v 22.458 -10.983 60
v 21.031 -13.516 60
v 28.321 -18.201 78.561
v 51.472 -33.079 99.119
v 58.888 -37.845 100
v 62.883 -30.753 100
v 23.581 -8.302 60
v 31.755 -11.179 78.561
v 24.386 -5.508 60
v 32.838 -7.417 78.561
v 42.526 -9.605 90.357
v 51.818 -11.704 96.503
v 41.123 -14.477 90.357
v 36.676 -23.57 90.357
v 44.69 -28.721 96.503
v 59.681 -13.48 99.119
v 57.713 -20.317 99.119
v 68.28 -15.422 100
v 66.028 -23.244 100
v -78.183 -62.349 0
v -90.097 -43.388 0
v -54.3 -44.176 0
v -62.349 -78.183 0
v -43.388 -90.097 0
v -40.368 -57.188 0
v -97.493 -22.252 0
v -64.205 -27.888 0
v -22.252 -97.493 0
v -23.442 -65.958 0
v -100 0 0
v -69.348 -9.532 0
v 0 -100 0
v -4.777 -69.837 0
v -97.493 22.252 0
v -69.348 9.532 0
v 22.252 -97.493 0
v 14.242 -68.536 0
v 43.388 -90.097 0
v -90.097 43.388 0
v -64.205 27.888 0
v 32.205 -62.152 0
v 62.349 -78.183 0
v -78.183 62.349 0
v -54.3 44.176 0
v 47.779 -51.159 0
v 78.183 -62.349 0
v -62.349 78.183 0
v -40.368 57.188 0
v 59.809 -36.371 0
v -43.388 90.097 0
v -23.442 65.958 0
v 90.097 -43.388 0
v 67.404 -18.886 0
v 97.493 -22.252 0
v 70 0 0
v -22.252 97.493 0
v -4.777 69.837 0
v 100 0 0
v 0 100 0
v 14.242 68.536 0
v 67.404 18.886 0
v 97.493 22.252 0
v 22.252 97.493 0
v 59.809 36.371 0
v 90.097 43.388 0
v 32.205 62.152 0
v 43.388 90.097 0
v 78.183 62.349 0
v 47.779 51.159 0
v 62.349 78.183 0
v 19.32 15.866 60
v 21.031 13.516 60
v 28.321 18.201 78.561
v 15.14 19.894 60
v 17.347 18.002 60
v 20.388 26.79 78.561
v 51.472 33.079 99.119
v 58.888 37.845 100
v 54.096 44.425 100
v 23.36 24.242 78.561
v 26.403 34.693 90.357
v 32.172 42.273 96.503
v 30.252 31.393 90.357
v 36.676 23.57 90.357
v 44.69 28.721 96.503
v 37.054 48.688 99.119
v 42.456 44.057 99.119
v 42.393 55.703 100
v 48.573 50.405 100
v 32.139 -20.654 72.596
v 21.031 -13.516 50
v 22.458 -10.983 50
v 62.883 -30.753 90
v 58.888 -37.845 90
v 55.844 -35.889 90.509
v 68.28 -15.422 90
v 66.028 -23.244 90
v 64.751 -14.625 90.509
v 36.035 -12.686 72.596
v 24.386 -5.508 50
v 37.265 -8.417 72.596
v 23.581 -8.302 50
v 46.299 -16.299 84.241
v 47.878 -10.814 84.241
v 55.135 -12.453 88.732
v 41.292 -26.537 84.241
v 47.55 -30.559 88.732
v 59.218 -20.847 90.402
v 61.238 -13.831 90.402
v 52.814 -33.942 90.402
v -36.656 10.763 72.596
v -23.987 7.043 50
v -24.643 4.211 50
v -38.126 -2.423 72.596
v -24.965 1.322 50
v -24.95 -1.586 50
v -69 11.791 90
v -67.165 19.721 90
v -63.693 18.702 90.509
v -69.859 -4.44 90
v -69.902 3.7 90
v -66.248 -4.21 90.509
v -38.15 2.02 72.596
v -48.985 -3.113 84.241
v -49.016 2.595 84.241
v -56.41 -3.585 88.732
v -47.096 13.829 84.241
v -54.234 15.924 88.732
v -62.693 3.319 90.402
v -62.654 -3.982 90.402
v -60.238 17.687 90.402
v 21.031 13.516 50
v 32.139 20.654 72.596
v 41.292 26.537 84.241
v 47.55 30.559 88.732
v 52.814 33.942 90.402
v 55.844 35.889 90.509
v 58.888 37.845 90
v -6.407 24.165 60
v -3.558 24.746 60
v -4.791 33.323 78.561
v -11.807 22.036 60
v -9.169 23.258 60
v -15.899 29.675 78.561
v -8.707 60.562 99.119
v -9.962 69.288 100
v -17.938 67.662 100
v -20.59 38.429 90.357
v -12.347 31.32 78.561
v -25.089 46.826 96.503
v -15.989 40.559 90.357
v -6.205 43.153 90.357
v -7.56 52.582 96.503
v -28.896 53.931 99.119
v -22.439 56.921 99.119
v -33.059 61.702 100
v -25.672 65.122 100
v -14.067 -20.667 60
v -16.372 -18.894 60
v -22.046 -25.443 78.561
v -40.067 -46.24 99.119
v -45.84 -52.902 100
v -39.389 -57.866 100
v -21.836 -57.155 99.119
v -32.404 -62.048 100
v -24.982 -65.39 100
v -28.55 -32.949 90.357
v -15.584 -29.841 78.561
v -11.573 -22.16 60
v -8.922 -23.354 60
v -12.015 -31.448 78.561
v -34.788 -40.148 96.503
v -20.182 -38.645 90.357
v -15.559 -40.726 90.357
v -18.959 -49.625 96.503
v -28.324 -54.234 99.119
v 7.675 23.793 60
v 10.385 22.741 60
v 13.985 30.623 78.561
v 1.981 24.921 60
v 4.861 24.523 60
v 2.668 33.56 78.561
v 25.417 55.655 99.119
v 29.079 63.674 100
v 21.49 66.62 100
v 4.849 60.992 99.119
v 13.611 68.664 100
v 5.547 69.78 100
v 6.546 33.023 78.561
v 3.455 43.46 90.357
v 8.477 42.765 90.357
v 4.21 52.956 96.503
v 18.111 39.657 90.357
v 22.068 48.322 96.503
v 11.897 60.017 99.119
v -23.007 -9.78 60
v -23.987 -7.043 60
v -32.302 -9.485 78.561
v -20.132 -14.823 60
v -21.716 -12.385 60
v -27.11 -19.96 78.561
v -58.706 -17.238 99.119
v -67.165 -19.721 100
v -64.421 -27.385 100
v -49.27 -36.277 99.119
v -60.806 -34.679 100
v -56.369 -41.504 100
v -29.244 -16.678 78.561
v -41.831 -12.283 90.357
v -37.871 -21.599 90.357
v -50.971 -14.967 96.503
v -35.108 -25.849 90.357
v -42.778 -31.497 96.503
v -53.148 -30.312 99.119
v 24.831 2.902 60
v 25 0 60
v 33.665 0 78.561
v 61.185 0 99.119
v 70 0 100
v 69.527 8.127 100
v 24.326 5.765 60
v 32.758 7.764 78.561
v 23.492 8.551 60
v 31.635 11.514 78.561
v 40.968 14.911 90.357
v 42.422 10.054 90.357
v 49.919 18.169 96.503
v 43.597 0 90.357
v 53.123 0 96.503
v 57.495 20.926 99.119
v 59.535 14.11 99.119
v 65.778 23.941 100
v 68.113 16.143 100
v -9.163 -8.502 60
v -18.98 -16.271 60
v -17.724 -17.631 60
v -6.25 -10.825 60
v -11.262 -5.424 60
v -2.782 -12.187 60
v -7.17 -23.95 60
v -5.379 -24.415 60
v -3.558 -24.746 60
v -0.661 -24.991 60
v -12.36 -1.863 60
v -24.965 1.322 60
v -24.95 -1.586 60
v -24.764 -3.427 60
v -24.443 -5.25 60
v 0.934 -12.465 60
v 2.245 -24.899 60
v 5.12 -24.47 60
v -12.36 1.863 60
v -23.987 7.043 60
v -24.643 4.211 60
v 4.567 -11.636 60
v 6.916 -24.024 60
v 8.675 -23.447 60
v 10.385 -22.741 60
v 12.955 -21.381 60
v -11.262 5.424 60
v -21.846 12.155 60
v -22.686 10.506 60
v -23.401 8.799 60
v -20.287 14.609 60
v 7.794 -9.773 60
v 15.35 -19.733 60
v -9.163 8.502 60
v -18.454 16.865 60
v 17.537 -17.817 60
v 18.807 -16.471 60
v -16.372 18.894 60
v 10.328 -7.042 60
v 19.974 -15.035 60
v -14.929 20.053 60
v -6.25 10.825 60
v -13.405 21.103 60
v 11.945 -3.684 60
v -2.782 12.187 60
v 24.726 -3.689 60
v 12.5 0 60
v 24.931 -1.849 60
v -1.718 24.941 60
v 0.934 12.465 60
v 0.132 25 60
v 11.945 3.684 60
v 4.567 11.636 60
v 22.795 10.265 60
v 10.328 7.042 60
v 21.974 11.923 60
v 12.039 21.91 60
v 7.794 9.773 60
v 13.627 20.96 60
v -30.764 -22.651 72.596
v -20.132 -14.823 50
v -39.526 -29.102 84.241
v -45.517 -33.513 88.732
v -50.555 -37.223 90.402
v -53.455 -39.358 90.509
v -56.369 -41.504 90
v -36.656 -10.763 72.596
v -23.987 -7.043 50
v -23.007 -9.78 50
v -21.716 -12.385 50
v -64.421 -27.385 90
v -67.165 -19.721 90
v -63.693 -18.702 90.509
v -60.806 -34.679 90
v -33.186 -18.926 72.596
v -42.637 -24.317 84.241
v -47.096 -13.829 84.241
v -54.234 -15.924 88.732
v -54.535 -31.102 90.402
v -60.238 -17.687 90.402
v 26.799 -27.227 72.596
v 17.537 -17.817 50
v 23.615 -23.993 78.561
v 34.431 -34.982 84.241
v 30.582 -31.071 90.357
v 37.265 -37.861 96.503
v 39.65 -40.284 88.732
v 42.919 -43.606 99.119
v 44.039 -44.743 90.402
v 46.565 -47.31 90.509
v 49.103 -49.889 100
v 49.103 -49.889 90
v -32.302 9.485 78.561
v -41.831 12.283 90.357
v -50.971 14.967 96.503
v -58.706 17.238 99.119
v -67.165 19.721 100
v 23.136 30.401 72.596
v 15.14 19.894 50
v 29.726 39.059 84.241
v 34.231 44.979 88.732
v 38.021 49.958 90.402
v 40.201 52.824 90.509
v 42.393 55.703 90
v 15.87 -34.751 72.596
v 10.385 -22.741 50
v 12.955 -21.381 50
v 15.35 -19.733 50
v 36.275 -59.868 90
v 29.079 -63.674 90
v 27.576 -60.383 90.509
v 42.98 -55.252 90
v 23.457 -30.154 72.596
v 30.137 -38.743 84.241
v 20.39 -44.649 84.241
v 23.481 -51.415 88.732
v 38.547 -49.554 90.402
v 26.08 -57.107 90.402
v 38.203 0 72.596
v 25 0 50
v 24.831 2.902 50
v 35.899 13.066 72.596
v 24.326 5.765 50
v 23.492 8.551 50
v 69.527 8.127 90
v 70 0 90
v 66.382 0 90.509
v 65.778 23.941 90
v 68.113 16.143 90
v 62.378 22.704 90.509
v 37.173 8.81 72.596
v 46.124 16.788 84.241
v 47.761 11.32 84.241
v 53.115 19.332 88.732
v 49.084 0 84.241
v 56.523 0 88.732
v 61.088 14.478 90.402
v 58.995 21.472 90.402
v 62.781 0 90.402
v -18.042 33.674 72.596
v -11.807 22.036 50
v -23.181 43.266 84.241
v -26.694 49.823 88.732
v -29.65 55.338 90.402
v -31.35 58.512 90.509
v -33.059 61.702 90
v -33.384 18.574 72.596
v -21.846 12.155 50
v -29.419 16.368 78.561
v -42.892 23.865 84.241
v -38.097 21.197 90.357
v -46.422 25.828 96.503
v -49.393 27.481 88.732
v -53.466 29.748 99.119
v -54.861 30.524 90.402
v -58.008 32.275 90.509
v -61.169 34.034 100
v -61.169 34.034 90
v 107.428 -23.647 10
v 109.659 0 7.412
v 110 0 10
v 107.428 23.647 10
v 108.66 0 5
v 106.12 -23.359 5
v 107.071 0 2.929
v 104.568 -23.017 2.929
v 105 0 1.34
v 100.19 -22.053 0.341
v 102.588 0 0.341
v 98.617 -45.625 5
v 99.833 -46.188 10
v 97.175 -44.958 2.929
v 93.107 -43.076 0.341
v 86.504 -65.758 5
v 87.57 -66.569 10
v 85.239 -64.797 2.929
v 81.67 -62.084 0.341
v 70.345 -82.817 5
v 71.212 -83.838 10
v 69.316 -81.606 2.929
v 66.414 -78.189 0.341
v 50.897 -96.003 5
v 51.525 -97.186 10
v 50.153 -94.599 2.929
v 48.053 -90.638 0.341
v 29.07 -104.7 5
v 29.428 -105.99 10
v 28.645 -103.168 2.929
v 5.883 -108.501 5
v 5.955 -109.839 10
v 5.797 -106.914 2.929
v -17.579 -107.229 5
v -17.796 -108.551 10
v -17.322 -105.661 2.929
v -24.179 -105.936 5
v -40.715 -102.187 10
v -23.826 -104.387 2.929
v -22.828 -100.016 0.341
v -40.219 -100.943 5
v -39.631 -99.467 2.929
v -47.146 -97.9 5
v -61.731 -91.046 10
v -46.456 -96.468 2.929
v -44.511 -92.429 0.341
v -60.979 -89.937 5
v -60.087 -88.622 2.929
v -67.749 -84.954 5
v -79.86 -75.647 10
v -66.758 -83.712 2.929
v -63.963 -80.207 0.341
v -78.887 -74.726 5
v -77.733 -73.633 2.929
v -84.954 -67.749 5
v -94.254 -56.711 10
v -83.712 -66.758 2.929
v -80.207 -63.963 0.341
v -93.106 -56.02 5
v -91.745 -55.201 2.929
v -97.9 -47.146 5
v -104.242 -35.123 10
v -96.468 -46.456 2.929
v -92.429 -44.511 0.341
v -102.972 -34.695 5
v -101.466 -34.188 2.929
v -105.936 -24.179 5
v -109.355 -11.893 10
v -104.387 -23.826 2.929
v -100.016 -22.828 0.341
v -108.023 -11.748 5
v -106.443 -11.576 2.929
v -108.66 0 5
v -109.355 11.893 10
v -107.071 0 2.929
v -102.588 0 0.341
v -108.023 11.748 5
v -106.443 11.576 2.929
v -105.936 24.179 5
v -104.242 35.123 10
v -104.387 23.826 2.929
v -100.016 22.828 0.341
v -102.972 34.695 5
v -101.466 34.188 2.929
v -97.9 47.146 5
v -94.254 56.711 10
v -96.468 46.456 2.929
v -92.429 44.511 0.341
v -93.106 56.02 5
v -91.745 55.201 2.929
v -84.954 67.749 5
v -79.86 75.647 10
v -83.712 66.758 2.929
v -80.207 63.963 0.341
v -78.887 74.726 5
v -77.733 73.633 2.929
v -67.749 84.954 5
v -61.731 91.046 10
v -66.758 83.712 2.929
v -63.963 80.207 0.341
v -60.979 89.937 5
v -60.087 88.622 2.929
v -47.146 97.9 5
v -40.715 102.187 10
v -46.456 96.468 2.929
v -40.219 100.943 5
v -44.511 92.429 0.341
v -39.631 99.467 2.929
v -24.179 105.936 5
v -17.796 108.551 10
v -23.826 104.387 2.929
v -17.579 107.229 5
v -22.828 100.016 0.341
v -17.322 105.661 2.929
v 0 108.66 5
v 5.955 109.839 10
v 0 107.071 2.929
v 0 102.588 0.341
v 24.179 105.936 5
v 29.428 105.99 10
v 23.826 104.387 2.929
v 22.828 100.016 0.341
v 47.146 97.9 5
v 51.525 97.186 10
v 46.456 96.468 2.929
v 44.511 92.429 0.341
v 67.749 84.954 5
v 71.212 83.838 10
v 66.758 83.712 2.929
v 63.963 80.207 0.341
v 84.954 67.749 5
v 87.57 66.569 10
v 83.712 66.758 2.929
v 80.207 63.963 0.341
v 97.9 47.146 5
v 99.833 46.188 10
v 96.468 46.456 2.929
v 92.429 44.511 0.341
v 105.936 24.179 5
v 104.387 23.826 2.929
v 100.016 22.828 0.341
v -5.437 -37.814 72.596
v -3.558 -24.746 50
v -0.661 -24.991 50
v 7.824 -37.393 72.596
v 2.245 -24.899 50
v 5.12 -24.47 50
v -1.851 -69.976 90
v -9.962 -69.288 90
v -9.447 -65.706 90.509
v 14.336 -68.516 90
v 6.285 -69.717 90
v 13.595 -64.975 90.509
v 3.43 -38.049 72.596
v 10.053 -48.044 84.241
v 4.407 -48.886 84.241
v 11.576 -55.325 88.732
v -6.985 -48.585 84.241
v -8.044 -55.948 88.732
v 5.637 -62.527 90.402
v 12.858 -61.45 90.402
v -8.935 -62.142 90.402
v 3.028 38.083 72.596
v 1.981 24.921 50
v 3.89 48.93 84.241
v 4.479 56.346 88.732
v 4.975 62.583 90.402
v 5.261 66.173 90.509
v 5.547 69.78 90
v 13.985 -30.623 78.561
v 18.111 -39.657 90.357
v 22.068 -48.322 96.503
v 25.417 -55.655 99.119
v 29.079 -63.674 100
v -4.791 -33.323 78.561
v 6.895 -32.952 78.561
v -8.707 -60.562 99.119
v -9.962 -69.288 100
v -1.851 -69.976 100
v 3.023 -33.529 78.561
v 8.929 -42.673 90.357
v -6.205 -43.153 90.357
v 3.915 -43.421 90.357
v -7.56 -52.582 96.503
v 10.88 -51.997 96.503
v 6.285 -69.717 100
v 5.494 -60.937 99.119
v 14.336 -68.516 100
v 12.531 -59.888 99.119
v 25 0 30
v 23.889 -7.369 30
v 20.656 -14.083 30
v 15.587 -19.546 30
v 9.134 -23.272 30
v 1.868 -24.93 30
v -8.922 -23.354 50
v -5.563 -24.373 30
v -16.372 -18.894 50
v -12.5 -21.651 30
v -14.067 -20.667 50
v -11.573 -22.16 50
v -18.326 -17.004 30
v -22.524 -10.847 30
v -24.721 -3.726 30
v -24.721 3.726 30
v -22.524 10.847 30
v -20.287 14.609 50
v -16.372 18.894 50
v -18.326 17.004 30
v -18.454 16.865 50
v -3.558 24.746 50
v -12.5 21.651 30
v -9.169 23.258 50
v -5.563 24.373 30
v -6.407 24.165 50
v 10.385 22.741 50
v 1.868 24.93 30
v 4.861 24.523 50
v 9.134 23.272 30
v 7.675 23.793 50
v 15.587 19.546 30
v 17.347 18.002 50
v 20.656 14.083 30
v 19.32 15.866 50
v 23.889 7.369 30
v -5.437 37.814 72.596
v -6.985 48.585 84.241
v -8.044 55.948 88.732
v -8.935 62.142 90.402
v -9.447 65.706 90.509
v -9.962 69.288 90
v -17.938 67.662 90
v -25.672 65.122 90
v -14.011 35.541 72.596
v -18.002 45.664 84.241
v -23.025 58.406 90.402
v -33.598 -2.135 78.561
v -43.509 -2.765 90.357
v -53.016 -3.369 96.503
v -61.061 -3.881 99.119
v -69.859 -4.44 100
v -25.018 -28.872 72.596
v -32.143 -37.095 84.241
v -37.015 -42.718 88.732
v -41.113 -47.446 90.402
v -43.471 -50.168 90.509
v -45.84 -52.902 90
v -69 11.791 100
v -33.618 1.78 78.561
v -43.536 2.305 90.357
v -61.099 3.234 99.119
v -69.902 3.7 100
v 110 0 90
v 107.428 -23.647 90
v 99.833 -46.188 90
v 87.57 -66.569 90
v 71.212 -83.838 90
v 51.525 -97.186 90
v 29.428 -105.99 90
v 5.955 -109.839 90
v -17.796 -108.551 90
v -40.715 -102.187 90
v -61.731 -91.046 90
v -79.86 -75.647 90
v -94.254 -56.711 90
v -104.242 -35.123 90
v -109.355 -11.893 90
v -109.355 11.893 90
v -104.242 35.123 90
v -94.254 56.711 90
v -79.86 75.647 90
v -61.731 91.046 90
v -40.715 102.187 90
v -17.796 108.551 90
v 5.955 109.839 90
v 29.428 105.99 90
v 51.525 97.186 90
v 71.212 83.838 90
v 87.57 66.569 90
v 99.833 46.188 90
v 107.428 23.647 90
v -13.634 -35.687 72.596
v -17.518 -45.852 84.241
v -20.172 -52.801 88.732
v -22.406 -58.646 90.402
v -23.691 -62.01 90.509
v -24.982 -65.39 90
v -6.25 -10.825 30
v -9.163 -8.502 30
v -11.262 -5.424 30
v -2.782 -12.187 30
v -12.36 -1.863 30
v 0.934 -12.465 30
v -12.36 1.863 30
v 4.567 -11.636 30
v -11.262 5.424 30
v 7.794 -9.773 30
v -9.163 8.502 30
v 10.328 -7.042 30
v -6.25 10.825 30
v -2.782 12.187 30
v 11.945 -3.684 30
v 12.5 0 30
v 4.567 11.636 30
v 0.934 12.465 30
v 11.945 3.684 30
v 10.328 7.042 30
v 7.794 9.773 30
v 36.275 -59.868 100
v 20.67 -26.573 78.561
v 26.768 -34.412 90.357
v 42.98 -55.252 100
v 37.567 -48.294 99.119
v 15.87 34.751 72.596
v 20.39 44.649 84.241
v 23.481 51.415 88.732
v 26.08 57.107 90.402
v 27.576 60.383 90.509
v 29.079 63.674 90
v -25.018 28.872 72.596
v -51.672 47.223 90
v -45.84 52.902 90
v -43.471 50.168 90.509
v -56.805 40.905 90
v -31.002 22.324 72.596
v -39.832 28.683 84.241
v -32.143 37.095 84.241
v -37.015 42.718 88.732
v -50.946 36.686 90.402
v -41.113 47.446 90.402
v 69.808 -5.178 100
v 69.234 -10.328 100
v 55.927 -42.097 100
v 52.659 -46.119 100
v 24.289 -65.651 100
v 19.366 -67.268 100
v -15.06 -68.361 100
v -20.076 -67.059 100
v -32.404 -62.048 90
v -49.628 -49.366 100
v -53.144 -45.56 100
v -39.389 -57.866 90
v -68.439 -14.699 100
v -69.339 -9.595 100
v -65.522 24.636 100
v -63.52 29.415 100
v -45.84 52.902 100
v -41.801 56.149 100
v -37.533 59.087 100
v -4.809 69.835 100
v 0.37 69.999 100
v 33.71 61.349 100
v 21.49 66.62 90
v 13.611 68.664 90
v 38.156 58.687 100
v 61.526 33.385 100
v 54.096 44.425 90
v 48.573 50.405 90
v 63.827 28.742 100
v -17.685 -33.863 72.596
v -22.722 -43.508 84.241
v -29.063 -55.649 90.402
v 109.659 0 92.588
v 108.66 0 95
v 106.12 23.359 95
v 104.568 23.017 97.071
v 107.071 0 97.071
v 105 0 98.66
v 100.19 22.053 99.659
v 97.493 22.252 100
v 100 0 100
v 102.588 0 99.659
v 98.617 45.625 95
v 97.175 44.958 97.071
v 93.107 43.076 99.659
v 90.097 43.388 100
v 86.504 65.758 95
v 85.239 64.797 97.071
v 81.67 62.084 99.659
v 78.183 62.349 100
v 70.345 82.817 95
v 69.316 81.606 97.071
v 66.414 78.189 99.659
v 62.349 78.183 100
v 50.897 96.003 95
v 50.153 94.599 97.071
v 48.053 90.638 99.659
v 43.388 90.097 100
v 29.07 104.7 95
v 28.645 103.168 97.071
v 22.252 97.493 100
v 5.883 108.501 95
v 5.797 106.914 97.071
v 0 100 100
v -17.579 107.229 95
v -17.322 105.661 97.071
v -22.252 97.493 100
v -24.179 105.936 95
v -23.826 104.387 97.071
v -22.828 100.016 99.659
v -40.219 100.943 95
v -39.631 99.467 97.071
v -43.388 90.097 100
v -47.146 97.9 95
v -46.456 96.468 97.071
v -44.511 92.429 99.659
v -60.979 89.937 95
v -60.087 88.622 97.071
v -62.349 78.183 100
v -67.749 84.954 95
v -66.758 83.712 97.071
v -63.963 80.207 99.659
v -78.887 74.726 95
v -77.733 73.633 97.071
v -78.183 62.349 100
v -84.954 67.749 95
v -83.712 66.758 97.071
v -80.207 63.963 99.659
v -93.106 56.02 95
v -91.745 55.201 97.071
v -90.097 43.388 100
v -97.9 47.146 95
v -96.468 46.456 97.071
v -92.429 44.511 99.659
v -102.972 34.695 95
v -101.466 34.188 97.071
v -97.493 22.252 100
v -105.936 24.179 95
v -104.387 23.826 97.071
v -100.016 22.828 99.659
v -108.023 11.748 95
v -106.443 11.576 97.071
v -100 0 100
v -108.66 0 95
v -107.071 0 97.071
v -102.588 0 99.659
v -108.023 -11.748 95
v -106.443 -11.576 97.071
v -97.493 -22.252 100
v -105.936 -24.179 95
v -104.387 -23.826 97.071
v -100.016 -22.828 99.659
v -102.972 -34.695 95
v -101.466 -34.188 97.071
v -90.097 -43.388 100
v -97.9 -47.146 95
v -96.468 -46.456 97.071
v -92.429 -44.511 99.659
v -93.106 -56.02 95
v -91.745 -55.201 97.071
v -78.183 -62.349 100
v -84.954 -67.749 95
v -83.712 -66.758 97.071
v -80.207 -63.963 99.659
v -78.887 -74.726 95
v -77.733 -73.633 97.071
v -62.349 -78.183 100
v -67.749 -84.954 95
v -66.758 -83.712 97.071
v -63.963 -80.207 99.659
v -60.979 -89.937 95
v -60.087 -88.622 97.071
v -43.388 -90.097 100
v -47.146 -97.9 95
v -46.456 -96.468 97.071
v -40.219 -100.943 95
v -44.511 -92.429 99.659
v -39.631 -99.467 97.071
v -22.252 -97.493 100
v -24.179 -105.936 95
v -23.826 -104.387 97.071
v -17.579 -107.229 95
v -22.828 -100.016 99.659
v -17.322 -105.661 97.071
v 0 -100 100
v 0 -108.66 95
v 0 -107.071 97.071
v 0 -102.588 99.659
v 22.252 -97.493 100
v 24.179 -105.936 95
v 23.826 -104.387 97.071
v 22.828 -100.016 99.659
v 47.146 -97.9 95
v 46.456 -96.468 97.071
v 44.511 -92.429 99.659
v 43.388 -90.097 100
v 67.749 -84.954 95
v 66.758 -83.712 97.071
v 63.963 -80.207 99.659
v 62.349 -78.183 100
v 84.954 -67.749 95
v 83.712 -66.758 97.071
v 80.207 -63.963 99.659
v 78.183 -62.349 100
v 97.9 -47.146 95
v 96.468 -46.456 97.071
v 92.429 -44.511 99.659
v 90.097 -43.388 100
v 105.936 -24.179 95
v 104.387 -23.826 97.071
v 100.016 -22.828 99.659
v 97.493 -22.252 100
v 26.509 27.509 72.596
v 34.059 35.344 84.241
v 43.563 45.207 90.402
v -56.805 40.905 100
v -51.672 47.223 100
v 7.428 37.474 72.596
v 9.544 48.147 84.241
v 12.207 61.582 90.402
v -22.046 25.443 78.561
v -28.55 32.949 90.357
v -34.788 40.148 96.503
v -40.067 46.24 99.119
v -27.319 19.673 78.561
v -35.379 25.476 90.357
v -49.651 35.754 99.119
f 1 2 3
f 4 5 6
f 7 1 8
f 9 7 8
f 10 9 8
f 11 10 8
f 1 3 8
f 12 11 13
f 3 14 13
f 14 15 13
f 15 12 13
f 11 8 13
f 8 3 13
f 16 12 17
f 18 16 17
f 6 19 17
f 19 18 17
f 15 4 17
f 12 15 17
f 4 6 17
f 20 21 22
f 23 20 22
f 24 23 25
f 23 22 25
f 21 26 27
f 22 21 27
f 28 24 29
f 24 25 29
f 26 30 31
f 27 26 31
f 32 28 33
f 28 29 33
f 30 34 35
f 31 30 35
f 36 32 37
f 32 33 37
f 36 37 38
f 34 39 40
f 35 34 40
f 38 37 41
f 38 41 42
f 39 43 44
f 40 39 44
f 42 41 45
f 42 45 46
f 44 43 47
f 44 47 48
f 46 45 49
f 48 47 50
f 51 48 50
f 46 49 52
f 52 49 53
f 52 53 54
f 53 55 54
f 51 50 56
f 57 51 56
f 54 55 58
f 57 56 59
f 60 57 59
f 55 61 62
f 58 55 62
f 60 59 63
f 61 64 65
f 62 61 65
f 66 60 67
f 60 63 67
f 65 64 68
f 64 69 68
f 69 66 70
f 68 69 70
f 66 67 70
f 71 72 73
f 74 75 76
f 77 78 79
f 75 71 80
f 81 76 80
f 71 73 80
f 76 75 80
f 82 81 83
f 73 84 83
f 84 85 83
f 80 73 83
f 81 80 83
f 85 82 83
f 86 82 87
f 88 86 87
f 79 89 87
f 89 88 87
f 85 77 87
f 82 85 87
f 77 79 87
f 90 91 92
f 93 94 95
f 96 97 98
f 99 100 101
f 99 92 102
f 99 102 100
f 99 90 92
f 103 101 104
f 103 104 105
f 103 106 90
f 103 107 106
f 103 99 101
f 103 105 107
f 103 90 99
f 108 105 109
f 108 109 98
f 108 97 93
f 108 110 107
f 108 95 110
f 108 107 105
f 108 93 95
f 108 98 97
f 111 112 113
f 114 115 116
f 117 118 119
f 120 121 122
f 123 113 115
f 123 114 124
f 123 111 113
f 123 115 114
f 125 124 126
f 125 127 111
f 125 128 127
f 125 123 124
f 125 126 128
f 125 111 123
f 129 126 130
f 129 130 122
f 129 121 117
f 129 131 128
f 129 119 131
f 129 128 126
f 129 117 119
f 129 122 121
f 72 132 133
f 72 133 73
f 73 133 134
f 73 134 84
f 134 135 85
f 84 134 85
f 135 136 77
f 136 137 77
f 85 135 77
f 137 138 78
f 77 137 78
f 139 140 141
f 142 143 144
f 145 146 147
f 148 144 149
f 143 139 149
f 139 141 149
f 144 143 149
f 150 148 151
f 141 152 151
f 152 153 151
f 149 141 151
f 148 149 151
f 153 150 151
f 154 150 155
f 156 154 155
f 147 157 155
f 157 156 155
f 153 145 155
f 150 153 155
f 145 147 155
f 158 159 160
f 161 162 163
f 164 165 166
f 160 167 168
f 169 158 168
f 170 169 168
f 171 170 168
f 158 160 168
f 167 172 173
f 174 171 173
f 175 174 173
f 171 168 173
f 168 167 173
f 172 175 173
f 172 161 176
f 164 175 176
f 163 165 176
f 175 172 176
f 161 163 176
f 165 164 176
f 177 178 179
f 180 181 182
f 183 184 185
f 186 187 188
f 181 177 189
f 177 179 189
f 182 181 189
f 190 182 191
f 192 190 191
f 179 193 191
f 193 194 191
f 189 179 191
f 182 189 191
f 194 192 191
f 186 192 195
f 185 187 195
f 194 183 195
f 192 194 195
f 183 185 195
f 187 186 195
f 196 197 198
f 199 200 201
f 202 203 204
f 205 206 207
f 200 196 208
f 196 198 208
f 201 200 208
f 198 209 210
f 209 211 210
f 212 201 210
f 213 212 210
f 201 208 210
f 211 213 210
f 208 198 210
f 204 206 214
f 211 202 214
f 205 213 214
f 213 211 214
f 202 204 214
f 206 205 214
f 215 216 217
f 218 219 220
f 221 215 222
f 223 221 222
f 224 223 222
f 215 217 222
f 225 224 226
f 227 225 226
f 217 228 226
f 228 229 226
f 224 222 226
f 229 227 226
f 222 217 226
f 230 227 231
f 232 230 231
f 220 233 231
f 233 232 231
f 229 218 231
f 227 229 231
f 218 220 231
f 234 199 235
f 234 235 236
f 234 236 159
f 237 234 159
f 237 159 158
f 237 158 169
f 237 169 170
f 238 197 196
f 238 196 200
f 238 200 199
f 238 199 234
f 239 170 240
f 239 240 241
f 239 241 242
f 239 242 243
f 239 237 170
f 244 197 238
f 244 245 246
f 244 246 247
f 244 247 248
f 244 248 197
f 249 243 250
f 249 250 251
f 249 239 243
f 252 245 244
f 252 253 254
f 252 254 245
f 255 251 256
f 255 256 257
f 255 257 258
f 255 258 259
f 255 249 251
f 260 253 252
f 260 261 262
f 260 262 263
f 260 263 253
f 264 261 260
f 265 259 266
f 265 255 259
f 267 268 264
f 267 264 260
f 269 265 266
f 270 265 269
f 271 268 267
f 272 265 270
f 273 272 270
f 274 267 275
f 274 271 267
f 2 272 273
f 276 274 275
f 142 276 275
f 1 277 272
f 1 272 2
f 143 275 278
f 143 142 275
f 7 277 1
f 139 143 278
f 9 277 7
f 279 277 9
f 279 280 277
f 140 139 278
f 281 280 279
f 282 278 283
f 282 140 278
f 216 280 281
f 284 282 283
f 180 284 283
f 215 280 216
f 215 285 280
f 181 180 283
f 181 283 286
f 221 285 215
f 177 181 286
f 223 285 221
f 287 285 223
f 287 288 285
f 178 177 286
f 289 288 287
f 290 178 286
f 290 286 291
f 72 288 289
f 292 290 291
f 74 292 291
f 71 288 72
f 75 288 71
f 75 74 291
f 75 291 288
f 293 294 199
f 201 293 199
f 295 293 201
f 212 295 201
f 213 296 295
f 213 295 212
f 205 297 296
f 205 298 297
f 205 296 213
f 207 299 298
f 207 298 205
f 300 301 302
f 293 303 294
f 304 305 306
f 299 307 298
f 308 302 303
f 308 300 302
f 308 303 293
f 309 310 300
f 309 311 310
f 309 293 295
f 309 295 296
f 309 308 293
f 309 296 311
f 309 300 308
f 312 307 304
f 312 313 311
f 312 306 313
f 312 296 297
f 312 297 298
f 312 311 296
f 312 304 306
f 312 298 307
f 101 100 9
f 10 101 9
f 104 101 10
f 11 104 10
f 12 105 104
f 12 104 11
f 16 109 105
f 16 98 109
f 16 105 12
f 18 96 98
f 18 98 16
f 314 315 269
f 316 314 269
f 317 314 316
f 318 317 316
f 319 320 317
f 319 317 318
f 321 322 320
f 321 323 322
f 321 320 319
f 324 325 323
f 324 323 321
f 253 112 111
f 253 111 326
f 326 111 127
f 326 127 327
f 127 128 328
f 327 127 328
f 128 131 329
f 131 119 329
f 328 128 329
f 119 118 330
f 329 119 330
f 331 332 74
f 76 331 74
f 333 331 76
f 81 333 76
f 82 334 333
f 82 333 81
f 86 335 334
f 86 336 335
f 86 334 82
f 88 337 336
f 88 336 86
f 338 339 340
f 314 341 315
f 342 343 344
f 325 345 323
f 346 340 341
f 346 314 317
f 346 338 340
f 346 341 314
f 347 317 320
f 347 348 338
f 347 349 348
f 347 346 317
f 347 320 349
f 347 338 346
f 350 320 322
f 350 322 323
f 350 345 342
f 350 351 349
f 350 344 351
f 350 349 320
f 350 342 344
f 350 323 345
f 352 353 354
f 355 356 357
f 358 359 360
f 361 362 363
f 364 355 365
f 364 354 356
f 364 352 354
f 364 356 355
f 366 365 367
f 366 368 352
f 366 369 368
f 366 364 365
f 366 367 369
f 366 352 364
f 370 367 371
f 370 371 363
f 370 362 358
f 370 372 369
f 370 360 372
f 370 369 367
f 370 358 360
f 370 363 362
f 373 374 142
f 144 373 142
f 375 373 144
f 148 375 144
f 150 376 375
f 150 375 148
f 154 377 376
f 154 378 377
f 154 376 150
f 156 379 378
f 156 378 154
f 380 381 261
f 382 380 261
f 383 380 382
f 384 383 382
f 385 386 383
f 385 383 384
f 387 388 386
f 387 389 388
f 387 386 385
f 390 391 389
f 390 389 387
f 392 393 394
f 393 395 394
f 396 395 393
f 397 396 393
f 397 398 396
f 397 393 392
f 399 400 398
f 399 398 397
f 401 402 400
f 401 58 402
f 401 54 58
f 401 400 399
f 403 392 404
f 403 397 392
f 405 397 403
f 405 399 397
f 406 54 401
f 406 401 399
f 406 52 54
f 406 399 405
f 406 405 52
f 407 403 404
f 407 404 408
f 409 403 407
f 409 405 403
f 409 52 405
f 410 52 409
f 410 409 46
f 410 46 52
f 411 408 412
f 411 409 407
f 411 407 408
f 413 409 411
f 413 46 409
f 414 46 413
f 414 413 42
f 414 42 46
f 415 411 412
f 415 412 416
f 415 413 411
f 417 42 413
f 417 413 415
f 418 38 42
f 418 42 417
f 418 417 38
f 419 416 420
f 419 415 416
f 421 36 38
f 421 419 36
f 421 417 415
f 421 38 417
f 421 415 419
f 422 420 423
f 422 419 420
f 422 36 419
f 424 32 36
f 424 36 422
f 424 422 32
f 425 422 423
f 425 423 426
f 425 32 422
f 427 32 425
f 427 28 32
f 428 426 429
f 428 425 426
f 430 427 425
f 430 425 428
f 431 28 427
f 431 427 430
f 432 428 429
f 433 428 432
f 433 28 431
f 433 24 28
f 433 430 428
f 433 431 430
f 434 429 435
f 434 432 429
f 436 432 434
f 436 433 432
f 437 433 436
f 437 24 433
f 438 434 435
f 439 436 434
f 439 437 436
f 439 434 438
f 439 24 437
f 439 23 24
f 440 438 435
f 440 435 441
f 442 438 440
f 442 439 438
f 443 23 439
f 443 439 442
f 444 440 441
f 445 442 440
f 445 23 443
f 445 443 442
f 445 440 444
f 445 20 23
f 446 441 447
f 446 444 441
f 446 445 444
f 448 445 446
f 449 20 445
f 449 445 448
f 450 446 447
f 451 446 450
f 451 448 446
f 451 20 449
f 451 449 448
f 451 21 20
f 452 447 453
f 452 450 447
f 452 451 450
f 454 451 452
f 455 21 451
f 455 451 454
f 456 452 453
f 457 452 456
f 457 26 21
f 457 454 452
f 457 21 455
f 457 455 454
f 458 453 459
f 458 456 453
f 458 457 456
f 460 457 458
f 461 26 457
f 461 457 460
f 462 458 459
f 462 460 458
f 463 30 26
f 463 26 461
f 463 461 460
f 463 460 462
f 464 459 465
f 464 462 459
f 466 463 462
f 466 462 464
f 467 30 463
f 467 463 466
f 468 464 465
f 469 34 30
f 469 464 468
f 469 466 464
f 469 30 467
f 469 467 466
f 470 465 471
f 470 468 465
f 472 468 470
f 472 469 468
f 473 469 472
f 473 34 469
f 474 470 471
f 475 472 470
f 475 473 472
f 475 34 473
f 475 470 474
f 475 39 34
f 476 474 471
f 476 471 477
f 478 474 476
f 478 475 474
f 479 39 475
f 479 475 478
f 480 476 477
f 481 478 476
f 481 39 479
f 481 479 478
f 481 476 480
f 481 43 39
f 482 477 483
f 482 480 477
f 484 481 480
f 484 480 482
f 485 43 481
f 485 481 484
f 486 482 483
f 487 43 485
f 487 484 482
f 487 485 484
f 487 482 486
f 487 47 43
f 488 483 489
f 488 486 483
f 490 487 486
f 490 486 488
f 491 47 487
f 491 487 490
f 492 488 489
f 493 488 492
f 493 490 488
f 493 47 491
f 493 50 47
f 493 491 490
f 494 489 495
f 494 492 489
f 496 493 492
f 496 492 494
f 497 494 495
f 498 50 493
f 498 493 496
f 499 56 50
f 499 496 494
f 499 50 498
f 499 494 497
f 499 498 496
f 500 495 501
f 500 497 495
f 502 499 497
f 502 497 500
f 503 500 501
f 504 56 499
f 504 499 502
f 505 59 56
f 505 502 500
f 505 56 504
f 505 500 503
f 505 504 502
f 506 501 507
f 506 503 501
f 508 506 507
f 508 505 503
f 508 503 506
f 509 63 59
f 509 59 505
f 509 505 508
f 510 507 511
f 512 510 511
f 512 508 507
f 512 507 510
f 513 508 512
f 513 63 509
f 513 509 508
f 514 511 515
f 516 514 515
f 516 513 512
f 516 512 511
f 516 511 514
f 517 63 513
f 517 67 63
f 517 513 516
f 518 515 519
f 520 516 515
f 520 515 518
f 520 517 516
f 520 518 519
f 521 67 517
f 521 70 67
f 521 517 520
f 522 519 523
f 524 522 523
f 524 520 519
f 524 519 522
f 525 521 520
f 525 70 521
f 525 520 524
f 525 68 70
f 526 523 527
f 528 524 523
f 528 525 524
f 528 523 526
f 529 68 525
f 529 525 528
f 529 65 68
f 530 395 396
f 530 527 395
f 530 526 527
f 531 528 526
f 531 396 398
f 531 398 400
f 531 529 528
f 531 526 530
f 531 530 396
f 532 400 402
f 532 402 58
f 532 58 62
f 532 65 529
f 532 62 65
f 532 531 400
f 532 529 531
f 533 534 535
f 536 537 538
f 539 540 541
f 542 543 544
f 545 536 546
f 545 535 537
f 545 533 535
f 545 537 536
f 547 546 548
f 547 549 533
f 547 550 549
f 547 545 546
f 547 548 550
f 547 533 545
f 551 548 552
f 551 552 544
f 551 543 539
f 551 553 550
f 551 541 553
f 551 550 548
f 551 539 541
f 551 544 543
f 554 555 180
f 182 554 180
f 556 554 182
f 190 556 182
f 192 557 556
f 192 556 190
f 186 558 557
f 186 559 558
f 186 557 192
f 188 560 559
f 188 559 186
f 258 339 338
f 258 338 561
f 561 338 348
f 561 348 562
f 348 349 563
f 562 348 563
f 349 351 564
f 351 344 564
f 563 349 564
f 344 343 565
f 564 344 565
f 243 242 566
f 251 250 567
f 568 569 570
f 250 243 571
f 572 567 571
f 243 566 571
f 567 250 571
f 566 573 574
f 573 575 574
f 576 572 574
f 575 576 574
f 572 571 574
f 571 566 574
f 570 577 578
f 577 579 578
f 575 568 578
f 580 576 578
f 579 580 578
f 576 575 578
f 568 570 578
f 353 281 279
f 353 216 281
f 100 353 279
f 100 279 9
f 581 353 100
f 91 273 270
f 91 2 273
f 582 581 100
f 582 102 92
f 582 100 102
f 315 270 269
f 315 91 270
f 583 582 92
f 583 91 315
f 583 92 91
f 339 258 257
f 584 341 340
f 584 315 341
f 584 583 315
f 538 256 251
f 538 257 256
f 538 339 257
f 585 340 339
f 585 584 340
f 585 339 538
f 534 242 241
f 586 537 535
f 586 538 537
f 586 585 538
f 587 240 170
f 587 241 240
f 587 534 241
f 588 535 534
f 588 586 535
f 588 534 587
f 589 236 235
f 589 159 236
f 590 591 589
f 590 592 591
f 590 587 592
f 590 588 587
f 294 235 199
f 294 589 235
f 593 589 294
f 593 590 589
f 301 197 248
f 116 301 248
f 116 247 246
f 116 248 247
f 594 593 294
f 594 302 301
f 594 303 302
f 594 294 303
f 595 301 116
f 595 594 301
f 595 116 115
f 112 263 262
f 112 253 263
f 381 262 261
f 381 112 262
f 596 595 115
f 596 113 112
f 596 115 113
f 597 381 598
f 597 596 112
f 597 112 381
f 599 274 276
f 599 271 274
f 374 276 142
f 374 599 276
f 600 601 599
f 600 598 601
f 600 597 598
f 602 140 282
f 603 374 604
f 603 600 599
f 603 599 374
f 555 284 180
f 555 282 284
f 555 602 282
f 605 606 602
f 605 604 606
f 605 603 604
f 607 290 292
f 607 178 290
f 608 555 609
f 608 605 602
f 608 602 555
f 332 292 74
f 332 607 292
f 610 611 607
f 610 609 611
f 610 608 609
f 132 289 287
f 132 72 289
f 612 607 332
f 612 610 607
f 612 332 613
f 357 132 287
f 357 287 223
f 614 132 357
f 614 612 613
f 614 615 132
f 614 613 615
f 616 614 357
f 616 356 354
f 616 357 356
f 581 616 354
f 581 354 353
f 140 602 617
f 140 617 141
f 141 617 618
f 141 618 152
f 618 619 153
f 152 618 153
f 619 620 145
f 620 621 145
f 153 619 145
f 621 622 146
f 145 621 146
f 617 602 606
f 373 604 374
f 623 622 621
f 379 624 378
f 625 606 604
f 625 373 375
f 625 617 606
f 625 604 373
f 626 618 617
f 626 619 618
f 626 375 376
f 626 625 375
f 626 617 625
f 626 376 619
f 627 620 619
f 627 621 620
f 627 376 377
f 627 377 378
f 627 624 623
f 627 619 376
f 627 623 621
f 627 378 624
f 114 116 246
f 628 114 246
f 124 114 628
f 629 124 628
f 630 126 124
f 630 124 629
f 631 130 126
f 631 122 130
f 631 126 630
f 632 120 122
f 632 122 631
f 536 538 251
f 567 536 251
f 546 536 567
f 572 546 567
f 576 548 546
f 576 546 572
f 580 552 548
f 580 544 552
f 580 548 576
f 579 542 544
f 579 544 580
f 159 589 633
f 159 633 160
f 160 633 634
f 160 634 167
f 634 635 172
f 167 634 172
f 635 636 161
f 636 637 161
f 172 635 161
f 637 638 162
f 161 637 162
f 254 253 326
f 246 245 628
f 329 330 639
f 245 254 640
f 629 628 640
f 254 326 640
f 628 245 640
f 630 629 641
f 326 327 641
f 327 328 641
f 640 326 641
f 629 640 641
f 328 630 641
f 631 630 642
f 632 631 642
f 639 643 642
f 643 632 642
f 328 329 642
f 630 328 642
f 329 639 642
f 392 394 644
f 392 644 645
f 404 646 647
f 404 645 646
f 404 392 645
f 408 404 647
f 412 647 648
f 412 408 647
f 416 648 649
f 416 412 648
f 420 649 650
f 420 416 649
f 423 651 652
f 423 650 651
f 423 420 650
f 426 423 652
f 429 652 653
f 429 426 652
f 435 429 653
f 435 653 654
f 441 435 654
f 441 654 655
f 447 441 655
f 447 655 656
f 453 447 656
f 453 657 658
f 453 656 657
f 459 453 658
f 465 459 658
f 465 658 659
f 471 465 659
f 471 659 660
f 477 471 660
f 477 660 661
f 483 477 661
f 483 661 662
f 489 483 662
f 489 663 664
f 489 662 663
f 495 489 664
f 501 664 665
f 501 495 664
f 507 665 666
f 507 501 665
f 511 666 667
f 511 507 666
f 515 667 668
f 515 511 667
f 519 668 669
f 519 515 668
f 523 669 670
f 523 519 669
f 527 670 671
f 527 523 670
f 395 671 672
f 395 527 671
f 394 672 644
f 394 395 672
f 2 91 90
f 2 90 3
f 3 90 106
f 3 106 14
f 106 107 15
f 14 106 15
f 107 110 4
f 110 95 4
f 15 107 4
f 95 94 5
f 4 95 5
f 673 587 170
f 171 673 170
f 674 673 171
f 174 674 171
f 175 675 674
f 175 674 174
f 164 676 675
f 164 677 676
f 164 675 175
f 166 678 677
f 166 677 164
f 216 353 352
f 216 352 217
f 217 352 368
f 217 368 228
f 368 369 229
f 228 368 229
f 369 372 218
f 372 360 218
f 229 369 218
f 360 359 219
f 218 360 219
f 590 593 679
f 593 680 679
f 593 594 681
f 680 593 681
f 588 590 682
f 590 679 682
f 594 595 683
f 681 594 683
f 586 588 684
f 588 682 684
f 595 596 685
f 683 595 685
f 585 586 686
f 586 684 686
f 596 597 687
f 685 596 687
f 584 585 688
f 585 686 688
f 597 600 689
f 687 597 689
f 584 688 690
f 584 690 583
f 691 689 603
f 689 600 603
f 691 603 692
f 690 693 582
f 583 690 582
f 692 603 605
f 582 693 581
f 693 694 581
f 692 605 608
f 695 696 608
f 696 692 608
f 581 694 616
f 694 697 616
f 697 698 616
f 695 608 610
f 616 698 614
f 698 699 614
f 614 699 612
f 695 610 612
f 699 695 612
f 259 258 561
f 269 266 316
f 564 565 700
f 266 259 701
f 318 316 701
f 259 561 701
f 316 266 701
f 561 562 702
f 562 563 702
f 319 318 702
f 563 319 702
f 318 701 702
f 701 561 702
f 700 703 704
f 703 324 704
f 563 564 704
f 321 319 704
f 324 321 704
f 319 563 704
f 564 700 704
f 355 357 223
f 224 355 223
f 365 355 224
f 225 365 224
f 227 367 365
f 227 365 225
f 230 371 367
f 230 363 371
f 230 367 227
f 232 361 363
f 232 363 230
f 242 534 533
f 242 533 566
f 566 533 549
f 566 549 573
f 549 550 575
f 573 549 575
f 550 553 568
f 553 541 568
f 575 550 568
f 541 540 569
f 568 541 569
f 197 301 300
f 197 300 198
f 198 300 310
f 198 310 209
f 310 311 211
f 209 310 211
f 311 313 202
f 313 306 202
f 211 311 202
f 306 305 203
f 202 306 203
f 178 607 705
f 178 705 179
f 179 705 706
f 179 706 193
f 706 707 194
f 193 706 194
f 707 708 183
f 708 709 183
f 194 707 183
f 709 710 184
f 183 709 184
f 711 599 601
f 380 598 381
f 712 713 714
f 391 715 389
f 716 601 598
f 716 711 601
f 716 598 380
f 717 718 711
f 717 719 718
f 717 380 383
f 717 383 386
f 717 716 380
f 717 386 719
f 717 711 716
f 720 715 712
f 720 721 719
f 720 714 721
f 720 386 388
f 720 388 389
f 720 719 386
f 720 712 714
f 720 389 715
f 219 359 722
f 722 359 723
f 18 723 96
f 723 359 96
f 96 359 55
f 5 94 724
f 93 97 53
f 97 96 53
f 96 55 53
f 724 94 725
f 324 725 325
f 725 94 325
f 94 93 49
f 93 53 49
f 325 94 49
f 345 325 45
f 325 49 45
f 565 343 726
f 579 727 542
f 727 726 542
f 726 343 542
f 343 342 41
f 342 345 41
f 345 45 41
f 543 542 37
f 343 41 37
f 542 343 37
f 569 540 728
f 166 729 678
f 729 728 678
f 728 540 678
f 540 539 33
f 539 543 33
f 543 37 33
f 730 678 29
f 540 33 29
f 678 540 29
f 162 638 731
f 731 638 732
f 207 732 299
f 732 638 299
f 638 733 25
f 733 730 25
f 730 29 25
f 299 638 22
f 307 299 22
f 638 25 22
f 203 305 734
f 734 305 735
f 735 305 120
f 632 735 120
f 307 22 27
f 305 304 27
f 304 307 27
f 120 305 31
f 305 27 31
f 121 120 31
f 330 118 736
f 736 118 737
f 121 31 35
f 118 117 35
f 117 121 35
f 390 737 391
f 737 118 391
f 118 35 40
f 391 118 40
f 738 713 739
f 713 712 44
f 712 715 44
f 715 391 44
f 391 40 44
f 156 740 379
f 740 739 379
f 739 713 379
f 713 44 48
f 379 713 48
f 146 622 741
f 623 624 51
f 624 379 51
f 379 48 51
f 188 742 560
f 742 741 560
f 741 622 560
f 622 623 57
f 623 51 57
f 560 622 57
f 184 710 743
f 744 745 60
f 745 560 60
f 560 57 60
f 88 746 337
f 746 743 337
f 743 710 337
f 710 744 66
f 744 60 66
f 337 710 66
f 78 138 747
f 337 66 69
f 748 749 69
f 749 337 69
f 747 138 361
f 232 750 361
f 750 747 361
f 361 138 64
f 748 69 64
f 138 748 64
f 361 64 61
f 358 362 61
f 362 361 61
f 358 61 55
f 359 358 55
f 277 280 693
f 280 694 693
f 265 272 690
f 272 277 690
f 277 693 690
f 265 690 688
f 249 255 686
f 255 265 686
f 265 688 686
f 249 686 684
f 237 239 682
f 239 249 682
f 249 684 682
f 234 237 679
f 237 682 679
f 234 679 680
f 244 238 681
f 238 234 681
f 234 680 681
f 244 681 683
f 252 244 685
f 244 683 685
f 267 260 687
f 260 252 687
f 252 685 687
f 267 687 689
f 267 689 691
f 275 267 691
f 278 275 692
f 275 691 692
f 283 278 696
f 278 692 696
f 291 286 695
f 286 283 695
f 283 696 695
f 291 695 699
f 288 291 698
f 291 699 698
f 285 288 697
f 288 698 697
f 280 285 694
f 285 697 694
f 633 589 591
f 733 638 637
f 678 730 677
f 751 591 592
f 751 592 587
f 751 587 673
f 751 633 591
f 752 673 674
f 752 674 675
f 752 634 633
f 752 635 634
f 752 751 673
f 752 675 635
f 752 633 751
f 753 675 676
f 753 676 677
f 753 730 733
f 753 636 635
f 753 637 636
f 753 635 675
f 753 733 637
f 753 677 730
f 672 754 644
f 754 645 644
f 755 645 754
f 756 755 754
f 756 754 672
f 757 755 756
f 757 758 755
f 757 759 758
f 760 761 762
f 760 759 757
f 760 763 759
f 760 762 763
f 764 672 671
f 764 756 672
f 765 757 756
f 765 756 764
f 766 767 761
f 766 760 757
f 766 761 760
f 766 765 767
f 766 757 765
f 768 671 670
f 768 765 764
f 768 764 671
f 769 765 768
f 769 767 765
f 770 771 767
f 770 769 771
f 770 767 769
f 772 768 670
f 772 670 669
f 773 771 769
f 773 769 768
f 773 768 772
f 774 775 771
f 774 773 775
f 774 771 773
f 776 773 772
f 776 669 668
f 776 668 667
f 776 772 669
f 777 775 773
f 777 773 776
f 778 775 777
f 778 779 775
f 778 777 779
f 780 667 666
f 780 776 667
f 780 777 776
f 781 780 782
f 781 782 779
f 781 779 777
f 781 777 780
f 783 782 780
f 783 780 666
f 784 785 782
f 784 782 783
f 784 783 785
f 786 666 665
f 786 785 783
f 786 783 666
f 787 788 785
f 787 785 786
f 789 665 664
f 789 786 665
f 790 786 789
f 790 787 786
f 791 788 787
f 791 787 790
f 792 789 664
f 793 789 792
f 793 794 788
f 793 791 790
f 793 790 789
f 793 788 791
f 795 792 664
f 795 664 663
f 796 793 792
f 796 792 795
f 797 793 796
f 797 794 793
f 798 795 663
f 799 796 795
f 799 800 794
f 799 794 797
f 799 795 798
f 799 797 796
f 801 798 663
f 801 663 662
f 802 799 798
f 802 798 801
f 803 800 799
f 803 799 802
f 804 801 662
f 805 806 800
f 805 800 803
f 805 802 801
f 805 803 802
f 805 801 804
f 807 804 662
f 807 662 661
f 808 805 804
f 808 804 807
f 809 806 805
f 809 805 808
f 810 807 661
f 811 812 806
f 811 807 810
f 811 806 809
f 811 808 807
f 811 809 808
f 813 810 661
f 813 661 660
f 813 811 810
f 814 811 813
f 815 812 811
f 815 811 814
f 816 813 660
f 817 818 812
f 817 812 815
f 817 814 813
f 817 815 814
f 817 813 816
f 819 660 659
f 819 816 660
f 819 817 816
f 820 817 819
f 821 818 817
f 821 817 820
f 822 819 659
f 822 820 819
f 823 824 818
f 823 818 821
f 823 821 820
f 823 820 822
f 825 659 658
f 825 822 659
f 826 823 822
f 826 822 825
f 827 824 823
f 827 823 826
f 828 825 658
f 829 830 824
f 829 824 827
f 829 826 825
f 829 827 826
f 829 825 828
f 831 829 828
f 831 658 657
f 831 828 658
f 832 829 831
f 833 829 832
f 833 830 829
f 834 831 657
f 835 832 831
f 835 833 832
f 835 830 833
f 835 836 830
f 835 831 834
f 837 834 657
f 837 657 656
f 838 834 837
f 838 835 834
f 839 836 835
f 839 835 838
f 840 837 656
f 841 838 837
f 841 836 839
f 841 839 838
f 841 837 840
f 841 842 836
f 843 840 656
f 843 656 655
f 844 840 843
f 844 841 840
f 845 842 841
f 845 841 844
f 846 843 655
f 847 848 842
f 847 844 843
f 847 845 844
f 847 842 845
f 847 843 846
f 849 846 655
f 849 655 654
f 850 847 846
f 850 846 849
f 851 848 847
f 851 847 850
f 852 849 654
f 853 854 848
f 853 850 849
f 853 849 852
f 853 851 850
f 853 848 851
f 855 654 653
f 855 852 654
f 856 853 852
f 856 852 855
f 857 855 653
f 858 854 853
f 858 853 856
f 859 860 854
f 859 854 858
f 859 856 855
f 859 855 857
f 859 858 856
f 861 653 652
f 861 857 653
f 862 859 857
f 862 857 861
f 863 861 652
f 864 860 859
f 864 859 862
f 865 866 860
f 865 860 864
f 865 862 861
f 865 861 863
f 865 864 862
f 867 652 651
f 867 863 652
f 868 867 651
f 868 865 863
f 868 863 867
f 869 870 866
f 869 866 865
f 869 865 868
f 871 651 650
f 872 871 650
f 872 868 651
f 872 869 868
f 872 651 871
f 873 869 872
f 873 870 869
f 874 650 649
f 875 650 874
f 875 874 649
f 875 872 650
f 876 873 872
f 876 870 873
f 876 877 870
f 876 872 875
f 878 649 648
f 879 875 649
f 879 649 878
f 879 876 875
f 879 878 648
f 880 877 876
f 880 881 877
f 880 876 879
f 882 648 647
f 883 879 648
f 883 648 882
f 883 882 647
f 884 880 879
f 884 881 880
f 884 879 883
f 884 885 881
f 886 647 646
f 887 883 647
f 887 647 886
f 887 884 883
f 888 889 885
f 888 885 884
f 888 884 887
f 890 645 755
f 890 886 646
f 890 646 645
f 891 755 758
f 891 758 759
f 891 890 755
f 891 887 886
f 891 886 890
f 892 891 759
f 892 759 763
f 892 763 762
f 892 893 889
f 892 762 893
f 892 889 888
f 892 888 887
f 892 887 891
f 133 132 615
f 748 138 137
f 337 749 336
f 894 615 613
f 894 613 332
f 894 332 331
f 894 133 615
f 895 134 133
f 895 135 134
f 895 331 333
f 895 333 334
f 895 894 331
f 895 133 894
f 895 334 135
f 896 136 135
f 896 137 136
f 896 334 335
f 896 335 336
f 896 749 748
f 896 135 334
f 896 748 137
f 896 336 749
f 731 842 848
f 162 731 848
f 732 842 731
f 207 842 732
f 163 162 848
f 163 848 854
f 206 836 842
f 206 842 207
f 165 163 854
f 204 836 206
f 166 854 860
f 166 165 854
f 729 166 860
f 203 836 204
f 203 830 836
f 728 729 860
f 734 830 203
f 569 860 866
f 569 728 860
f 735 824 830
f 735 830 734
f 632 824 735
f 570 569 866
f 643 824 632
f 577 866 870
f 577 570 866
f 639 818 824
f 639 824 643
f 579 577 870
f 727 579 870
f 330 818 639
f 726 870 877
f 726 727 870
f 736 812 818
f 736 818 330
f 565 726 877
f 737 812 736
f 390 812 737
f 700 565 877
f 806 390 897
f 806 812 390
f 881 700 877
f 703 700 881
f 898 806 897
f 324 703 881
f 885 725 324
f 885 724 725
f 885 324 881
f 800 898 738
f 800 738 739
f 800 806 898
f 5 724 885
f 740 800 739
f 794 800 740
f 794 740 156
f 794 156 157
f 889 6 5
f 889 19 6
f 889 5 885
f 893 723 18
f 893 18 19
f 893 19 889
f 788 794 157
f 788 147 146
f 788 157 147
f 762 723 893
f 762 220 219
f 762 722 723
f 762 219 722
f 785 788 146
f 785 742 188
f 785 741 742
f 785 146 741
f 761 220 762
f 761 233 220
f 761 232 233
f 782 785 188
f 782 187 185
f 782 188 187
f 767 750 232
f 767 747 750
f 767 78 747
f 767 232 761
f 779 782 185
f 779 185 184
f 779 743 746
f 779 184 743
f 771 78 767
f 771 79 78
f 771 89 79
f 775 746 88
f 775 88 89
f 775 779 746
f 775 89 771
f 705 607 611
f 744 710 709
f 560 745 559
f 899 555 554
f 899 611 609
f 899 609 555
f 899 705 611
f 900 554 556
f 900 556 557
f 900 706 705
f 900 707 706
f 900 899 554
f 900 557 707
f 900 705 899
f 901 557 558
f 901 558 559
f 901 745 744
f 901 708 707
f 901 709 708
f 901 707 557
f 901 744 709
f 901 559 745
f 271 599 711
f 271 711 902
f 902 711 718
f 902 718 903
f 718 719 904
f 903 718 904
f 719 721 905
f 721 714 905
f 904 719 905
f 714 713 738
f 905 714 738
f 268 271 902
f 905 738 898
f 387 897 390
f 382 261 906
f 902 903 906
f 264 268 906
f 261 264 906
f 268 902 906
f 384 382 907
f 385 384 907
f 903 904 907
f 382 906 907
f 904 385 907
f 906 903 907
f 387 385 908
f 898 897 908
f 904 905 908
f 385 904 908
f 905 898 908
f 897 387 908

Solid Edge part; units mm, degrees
sketch "Sketch1" plane through (0, 0, 0) normal (0, 0, 1) x (1, 0, 0)
  circle A0 centre (0, 0) radius 110
  circle A1 centre (0, 0) radius 70
  dimension "D1" = 220
  dimension "D2" = 140
extrude "Protrusion1" add sketch "Sketch1" along normal blind 100
fillet "Verrundung_1" radius 10 2 edges at (-110, 0, 100) (-110, 0, 0)
sketch "Sketch2" plane through (0, 0, 30) normal (0, 0, 1) x (1, 0, 0)
  circle A0 centre (0, 0) radius 25
  circle A1 centre (0, 0) radius 12.5
  dimension "D1" = 50
  dimension "D2" = 25
extrude "Extrusionsausprägung_2" add sketch "Sketch2" along normal blind 30
sketch "Sketch3" plane through (0, 0, 0) normal (0, -1, 0) x (1, 0, 0)
  line L0 (70, 100) -> (70, 90)
  spline S0 degree 3 poles (25, 50) (39.5289, 80.1519) (54.5289, 93.4852) (70, 90) knots 0 0 0 0 1 1 1 1
  line L1 (25, 60) -> (25, 50)
  spline S1 degree 3 poles (25, 60) (34.2198, 86.6371) (49.2198, 99.9704) (70, 100) knots 0 0 0 0 1 1 1 1
  dimension "D1" = 10
  dimension "D2" = 10
revolve "Rotationsausprägung_1" add sketch "Sketch3" angle 20 about axis through (0, 0, 54) along (0, 0, 1)
pattern_circular "Pattern1" count 11 over 360 about axis through (0, 0, 100) along (0, 0, 1) of "Rotationsausprägung_1"
